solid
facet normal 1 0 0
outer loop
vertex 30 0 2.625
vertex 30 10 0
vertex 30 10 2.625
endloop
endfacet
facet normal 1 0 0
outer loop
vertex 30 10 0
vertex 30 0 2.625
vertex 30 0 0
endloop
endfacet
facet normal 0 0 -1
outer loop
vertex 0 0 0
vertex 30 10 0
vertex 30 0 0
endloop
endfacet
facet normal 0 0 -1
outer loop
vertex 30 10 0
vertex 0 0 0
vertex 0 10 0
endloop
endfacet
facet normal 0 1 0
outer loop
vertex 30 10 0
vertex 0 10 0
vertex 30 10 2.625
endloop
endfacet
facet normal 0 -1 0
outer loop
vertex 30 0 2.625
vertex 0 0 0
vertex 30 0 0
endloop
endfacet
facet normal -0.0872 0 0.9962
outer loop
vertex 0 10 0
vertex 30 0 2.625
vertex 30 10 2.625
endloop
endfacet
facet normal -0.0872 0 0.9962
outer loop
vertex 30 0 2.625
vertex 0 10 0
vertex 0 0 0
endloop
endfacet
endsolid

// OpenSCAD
difference() {
	cube([30, 10, 10]);
	rotate([0, -5, 0]) {
		cube(40);
	}
}
